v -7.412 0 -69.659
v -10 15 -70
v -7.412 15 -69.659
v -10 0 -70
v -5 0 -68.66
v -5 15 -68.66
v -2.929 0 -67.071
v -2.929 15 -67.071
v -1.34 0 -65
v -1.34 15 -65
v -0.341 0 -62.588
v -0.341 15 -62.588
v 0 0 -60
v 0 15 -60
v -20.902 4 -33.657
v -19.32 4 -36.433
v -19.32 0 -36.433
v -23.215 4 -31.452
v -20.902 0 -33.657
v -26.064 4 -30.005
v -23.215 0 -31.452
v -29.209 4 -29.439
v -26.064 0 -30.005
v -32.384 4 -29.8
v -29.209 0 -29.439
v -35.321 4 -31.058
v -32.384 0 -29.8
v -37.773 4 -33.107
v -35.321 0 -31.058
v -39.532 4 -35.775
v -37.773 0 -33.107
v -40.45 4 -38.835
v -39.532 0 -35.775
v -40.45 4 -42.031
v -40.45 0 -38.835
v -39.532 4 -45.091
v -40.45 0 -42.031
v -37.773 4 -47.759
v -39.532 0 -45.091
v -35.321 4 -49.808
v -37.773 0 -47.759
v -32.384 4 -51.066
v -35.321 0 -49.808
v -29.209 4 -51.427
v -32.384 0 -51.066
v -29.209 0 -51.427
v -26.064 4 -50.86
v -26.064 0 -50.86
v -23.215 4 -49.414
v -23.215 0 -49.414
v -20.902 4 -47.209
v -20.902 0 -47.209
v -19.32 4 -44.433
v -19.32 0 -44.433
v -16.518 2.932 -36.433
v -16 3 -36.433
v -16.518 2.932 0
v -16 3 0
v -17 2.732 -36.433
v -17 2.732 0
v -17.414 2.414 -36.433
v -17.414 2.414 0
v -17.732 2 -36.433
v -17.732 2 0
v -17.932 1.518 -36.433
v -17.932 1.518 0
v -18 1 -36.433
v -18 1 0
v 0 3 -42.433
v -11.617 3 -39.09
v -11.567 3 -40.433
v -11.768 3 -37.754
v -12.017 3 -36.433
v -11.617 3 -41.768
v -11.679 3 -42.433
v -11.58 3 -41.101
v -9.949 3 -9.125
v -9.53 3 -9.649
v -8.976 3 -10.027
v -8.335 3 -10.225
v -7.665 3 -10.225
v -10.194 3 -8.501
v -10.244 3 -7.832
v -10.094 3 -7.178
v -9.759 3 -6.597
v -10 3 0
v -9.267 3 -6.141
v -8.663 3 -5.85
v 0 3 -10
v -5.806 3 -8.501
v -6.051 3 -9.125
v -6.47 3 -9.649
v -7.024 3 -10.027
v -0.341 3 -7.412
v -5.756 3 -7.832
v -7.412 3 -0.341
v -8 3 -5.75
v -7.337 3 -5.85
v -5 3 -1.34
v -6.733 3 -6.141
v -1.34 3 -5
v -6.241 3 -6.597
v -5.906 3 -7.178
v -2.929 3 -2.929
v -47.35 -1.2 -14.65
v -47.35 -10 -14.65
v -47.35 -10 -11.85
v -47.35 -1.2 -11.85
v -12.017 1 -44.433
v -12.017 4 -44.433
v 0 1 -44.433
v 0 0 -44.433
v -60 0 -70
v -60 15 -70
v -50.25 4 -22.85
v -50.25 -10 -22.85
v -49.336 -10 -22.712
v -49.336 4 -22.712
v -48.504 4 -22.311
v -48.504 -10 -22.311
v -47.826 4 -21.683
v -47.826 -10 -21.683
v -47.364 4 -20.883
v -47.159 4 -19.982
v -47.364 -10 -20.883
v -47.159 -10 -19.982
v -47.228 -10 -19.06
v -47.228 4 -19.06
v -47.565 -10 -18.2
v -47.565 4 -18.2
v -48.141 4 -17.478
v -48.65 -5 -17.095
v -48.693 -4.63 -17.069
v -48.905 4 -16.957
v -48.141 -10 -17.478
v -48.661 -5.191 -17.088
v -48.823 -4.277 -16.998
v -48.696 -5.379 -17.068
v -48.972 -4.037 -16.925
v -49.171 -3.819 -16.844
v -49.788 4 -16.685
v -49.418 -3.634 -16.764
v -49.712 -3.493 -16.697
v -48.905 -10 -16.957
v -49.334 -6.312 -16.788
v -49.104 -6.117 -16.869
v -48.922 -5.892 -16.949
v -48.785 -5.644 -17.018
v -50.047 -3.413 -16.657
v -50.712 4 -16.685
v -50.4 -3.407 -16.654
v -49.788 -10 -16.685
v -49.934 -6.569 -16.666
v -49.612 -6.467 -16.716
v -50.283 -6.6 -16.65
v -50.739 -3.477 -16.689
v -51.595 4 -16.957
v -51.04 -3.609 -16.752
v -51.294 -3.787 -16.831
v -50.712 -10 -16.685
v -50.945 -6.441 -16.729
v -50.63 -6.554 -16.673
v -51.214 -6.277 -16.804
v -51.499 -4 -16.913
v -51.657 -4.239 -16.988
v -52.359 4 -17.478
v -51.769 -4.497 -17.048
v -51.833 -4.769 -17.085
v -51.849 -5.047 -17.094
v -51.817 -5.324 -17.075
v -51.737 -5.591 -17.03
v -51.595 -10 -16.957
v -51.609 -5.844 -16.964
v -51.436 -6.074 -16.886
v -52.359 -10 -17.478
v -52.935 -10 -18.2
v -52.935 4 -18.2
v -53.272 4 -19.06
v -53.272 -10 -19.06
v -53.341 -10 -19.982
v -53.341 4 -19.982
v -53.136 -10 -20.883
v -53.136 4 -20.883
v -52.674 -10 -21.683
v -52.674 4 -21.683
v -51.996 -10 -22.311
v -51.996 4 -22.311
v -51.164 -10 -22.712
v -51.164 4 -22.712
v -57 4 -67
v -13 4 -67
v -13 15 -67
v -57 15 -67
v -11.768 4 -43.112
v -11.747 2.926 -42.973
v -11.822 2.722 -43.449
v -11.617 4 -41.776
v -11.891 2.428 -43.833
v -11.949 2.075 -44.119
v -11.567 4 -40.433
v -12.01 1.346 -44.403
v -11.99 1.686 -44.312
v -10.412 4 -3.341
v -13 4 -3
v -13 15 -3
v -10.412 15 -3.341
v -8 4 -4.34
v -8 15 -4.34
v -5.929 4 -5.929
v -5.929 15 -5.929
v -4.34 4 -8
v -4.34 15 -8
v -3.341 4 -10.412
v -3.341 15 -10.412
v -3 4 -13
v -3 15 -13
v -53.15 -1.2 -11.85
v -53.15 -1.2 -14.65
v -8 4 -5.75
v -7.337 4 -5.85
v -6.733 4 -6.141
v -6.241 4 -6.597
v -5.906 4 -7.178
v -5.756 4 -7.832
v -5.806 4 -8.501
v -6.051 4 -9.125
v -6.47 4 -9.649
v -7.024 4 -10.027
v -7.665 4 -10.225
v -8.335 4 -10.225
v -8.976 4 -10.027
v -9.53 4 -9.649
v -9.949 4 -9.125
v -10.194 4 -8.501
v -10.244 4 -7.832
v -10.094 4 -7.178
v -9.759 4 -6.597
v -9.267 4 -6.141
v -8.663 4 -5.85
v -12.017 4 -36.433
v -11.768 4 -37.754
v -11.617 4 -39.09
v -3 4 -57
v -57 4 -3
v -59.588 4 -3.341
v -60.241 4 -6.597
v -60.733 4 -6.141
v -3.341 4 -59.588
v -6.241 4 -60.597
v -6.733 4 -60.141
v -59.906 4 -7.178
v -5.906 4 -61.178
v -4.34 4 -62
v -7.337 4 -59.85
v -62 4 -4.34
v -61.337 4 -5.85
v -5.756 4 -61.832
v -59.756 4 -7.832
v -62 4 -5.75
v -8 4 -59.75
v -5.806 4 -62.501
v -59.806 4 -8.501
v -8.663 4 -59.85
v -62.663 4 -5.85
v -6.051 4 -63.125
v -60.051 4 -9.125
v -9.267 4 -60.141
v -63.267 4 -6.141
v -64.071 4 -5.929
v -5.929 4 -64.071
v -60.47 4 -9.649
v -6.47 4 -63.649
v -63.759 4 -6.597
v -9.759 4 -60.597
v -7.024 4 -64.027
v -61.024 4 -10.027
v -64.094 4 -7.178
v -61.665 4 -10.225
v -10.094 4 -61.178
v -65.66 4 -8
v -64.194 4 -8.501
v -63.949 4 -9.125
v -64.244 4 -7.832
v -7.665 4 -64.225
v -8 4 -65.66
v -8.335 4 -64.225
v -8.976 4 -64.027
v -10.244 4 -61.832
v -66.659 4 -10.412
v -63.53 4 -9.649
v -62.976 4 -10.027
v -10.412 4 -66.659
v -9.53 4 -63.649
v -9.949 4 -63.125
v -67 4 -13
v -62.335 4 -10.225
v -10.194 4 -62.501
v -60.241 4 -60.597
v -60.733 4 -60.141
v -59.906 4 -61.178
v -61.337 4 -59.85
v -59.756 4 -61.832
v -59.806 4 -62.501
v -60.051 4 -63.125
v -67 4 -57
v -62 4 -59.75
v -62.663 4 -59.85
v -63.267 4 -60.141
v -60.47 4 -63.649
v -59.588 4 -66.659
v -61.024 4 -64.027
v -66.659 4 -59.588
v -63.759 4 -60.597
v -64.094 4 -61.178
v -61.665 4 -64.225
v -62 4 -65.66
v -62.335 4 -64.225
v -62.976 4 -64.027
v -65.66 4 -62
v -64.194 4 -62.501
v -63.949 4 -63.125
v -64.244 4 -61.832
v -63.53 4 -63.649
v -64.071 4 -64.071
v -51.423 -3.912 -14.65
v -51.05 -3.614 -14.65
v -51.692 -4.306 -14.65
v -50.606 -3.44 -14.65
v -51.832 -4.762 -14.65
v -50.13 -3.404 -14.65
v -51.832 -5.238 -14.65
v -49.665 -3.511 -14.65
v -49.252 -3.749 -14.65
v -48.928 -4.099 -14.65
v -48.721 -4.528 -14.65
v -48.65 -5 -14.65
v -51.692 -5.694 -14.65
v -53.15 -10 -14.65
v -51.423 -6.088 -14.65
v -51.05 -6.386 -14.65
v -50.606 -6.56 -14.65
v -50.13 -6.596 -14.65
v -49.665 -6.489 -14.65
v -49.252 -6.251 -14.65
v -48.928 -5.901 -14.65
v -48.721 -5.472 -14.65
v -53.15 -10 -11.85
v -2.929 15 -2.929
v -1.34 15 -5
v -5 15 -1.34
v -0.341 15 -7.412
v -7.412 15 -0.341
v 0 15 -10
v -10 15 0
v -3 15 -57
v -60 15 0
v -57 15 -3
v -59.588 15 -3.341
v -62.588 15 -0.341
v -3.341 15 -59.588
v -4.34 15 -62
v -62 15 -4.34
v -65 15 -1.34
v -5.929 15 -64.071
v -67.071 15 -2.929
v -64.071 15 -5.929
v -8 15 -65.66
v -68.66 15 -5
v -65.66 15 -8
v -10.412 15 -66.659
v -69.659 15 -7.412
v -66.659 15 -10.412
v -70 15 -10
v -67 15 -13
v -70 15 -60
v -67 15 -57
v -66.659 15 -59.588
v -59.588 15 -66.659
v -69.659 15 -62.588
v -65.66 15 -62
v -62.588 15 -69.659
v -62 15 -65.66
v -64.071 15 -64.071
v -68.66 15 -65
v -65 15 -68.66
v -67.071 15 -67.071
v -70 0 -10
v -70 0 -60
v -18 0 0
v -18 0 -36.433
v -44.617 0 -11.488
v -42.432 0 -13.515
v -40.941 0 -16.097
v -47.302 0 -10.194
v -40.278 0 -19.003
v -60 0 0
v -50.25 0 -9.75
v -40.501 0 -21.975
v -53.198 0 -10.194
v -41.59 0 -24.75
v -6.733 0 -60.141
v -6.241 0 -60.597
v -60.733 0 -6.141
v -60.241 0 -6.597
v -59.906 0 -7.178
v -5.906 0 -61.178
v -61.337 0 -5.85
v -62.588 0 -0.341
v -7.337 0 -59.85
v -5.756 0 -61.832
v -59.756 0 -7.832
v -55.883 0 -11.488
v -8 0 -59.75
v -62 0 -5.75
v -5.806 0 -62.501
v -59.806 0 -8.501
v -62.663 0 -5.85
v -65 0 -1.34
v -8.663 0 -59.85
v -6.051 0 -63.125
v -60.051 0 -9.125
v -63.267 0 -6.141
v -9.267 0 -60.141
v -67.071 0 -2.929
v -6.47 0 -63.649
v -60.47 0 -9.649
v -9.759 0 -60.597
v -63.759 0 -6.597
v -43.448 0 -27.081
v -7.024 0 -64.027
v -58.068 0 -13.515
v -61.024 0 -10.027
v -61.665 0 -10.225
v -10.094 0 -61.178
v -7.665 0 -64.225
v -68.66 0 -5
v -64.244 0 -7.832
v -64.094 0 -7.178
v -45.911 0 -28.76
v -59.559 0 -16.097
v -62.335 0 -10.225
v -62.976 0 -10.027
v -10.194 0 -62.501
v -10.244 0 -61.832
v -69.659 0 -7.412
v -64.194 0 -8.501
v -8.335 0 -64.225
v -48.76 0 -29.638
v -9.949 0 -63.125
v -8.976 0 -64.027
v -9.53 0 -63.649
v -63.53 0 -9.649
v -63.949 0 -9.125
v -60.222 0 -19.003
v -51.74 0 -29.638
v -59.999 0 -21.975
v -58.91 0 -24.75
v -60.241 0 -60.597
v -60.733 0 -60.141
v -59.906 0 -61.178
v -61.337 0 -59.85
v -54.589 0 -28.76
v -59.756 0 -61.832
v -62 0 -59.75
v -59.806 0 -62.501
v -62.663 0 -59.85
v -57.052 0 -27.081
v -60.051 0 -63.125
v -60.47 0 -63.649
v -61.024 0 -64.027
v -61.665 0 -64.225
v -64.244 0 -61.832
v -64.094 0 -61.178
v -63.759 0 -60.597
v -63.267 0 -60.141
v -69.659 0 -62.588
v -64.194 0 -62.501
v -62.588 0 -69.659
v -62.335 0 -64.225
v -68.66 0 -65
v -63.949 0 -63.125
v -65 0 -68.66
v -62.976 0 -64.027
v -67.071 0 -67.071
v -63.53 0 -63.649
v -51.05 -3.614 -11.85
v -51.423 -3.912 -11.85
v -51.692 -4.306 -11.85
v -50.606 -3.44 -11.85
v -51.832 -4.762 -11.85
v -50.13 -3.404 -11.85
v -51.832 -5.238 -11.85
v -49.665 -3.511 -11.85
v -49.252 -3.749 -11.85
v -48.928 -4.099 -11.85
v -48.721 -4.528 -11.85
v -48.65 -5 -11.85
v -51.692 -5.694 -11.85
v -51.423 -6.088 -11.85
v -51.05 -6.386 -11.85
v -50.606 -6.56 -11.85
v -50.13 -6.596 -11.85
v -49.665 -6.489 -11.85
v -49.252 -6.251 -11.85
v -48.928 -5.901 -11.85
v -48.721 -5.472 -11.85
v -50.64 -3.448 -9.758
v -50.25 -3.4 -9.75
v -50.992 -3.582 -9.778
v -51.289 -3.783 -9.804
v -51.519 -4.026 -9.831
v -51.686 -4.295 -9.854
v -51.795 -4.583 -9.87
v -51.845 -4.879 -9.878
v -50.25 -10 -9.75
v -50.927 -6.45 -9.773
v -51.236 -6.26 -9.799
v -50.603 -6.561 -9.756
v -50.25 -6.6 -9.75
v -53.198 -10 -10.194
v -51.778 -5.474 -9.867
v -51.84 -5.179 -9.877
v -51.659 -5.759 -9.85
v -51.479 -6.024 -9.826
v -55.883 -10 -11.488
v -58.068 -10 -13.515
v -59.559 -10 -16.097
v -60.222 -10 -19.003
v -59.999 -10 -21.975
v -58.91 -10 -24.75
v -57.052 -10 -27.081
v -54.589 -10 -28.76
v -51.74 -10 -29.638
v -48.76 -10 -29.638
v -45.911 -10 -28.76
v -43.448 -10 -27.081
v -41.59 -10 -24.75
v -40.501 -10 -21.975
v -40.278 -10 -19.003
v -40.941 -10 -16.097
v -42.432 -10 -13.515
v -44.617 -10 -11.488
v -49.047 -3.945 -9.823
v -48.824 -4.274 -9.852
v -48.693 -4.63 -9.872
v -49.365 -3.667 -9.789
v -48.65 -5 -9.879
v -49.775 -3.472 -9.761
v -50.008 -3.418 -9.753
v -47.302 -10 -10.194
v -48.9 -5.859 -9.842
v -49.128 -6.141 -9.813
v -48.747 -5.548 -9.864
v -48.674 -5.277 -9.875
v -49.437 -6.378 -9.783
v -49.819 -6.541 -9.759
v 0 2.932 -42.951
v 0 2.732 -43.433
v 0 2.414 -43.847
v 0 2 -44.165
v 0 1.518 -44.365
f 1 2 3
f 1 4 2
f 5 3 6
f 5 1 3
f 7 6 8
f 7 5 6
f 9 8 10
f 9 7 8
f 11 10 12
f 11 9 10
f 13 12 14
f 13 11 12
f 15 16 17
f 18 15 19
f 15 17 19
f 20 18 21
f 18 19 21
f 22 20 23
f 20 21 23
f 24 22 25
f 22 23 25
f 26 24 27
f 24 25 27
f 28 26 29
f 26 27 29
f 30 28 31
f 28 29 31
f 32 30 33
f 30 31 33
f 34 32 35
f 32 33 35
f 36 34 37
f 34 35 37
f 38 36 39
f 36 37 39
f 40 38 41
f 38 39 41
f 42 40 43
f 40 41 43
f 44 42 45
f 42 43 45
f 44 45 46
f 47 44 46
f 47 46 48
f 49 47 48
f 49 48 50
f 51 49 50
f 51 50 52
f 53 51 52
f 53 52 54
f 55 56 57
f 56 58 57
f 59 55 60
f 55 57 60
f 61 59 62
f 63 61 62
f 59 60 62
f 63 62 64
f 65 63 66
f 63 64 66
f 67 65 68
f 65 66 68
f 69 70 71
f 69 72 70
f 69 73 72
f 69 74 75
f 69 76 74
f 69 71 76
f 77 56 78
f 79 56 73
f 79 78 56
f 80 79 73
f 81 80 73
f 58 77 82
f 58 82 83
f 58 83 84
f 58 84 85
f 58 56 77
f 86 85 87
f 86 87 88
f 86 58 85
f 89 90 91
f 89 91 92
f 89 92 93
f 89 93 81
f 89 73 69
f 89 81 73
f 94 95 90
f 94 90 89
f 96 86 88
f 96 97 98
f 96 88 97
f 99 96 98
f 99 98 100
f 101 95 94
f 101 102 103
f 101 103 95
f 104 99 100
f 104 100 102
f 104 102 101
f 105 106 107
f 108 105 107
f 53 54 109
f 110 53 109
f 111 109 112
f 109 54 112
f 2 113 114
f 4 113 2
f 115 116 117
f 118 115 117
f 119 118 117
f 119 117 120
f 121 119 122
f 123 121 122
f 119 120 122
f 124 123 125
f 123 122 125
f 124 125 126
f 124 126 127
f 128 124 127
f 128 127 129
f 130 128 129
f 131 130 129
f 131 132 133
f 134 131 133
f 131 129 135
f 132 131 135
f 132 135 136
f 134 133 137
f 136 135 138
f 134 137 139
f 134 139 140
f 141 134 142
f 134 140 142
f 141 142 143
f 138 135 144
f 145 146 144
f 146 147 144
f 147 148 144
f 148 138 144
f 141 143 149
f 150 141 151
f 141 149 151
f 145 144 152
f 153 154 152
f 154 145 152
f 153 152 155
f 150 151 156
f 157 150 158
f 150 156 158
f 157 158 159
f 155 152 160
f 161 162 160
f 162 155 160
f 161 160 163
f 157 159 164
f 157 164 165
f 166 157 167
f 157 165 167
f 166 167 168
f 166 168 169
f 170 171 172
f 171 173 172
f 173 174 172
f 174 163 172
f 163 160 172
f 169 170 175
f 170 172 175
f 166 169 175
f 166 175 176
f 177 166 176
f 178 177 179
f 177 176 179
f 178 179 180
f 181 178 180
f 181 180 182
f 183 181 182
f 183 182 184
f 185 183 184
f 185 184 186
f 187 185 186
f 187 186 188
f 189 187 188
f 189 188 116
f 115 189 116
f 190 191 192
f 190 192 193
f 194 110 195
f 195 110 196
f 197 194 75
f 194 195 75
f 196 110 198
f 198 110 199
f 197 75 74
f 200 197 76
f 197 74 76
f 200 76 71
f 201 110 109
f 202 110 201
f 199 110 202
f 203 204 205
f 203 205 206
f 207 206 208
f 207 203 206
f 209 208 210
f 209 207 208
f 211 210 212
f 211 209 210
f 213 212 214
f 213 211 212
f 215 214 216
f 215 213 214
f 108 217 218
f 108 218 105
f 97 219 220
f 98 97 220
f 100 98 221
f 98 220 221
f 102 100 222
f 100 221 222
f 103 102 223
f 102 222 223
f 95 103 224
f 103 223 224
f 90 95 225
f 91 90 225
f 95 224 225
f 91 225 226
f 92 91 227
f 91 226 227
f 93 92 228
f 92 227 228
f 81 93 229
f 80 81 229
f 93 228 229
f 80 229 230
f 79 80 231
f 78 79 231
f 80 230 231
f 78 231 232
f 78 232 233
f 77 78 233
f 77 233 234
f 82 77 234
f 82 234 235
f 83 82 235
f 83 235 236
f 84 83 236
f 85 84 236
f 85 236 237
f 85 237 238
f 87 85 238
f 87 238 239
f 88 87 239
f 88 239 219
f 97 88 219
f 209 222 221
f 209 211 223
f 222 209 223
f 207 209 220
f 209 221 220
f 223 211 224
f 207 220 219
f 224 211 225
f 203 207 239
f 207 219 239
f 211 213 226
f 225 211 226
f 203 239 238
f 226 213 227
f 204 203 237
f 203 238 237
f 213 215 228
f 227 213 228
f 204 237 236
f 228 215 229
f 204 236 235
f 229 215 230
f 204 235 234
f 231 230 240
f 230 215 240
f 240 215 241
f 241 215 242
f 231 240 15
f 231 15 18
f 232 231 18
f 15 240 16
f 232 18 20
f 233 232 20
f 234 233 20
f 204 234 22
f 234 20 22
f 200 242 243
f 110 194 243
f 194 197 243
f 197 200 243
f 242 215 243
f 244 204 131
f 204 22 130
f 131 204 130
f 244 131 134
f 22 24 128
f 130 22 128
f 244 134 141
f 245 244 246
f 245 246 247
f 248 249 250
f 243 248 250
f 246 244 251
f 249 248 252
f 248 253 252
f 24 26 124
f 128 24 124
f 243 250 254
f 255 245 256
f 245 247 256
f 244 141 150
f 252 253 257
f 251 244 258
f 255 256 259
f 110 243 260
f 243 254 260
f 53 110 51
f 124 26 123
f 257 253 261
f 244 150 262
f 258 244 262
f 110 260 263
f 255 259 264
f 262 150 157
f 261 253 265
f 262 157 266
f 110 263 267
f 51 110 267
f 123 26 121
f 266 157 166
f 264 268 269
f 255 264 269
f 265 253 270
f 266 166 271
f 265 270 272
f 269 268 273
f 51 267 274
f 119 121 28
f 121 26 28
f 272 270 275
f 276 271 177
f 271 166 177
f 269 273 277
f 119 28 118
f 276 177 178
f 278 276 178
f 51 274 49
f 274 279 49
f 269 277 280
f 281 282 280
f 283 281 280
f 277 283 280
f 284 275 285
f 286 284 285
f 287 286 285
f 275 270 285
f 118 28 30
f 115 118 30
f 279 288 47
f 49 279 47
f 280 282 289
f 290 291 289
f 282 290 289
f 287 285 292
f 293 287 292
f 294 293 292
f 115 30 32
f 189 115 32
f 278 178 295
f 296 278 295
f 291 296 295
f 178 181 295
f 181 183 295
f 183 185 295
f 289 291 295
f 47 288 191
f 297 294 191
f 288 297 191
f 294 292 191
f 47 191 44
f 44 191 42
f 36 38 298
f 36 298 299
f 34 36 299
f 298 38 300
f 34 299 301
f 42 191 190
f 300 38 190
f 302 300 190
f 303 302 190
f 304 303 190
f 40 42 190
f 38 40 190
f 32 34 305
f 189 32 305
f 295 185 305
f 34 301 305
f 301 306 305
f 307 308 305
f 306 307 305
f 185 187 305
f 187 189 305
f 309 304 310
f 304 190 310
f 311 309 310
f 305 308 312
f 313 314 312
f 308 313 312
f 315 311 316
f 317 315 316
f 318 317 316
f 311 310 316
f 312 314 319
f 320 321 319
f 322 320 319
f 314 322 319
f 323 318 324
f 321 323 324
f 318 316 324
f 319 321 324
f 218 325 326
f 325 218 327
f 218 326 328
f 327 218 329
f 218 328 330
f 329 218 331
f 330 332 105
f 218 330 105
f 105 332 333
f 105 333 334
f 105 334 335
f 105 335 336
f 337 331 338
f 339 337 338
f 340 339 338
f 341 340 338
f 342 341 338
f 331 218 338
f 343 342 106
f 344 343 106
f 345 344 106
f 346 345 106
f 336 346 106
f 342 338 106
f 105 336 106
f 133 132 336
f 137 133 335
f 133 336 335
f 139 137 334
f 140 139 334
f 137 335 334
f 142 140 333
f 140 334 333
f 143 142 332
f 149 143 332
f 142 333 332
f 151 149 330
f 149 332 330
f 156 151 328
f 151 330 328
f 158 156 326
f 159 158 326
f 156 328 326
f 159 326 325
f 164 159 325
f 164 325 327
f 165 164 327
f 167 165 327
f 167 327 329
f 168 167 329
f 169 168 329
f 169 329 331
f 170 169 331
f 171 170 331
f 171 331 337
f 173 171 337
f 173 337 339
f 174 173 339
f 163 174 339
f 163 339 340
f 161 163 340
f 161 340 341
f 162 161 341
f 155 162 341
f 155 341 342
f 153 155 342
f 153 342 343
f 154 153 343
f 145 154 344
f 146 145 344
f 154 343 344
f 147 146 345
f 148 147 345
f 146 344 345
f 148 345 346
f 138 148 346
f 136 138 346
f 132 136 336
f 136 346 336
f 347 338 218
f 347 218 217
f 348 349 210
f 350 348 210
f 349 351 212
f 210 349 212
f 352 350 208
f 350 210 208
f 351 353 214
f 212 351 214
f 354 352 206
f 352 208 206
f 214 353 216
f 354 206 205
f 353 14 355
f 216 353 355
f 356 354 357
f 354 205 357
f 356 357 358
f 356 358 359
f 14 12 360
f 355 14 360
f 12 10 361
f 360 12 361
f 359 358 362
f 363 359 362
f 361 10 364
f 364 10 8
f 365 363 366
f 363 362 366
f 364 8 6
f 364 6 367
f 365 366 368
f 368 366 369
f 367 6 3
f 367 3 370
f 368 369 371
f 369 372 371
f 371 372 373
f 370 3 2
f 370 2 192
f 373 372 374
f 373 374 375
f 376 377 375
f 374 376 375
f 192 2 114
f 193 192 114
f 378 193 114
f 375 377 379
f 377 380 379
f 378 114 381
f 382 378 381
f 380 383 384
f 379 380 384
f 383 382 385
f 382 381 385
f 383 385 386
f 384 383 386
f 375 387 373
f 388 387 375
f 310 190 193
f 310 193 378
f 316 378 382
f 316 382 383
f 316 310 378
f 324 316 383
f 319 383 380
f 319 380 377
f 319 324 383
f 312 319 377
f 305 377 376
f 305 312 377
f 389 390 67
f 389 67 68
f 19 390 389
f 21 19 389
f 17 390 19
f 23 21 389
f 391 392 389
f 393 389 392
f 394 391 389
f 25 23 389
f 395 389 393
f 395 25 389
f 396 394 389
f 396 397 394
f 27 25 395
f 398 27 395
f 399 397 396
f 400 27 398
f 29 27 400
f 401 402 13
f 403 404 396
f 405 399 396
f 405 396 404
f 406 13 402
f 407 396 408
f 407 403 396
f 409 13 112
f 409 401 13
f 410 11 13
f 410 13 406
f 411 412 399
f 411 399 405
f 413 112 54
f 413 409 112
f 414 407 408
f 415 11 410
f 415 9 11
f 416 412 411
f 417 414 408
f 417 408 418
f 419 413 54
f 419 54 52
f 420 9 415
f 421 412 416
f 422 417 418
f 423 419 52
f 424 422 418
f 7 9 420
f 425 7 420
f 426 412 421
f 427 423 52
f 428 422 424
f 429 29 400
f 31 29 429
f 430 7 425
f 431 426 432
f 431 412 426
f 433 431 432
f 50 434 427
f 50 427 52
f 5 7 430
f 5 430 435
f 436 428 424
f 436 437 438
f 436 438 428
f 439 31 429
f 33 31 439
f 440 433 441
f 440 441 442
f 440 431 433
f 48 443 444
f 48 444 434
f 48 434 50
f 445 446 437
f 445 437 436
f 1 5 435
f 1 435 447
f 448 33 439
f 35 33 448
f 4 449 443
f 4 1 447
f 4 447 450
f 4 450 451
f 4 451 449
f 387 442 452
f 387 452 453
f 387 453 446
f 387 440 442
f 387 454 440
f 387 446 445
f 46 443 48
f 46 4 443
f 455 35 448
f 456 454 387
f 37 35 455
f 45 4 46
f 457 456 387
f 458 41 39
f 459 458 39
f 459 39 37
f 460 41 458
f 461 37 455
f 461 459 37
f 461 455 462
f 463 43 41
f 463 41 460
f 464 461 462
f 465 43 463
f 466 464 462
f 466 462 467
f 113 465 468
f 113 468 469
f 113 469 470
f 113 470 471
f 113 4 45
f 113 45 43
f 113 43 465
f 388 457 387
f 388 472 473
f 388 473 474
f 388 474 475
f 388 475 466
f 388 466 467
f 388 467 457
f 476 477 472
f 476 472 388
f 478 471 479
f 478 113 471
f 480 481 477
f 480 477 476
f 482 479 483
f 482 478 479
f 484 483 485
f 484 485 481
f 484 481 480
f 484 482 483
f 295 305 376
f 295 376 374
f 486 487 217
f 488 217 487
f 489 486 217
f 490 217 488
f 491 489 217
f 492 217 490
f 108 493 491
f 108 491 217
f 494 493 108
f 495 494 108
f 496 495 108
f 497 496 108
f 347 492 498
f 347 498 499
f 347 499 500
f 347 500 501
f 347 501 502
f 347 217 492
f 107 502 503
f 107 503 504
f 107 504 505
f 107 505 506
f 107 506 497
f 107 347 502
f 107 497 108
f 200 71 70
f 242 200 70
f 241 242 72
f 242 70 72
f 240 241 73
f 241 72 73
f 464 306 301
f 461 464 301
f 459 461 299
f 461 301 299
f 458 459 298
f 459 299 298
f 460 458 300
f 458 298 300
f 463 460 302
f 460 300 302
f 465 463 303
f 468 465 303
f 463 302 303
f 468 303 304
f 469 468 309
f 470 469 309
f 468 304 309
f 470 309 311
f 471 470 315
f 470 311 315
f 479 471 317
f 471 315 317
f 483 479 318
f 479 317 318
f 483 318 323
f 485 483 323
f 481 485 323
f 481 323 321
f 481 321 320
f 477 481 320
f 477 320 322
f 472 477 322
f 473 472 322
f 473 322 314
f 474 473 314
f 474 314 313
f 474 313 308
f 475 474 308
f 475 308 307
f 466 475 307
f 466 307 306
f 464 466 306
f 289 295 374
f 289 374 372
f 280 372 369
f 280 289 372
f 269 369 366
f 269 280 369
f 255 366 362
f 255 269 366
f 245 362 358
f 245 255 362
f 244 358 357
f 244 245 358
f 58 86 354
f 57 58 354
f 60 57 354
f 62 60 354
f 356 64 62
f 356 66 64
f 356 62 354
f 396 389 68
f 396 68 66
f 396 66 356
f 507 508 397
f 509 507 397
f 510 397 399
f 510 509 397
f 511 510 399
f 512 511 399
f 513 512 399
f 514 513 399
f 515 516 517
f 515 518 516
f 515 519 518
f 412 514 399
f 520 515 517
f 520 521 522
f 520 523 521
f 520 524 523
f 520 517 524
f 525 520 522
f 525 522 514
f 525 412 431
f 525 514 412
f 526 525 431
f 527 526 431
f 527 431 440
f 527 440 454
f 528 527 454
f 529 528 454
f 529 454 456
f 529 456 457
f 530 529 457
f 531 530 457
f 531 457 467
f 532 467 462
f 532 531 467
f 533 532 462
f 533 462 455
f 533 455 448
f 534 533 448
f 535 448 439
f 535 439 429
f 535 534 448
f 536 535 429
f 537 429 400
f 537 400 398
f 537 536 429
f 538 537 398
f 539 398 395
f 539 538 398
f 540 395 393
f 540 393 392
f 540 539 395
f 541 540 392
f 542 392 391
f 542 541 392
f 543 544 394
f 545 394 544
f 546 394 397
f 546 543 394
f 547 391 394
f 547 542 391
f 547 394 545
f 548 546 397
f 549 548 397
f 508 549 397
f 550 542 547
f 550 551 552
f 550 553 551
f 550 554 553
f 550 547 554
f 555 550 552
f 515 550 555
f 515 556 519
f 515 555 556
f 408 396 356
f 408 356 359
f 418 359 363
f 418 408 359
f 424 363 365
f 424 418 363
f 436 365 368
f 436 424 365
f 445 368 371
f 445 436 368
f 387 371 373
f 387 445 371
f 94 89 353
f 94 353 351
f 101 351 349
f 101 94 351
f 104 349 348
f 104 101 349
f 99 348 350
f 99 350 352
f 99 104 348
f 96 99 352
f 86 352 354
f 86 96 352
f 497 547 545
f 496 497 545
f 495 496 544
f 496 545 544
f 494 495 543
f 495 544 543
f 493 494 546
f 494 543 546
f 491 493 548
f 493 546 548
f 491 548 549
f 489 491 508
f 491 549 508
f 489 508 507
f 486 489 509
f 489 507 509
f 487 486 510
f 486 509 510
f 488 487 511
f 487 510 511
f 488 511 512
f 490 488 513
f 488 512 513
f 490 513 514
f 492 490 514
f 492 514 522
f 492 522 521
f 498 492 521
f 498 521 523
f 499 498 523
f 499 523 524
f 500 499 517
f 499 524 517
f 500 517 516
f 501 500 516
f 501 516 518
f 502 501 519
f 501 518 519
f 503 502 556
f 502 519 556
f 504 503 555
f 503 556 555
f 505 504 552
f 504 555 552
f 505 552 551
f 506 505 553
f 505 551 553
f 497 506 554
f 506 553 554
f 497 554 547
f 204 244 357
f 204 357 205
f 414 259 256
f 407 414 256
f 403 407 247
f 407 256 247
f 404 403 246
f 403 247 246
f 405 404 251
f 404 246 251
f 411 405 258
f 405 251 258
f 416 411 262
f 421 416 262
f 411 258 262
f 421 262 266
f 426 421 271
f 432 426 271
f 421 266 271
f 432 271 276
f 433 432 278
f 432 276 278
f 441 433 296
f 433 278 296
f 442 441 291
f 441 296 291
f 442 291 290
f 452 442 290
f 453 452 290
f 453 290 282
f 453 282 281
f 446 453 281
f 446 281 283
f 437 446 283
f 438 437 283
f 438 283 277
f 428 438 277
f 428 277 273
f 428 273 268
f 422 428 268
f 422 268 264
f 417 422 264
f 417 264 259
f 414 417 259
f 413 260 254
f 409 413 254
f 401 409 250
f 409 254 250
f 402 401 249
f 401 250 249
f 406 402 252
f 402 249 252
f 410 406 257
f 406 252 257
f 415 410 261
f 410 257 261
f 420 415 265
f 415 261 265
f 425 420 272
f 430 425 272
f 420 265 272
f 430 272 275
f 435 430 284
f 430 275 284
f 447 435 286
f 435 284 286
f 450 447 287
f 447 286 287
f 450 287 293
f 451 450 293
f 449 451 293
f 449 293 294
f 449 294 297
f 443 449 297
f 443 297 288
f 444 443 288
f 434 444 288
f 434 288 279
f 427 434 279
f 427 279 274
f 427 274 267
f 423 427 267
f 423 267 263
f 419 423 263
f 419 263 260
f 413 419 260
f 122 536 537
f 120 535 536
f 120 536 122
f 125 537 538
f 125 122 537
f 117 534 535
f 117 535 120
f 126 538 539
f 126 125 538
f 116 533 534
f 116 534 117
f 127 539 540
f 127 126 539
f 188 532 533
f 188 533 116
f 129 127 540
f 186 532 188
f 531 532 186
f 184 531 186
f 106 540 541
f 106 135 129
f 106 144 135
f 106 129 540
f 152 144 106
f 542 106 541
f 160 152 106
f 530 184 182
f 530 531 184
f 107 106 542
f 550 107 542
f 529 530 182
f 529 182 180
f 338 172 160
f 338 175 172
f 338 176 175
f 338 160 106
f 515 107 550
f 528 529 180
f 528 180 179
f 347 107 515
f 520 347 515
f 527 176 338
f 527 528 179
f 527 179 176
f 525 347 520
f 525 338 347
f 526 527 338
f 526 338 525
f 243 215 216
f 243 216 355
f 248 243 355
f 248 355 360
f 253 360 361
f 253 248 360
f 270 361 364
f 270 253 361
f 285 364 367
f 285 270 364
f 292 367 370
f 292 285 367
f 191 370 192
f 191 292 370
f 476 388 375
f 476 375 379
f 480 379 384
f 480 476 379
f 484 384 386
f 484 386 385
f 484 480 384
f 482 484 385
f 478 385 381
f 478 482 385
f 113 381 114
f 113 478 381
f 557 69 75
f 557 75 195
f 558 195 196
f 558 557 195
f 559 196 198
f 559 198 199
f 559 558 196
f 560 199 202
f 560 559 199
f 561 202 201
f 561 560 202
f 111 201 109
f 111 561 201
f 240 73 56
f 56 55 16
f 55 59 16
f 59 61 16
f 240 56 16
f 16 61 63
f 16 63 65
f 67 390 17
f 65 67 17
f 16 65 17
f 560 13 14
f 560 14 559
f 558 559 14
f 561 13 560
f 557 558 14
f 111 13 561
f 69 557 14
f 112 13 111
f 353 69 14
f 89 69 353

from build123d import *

# Parameters (mm, degrees)
SKETCH1_R           = 2.5
BOSS_EXTRUDE2_DEPTH = 4
BOSS_EXTRUDE3_DEPTH = 11
SKETCH3_R           = 3.1
CUT_EXTRUDE1_DEPTH  = 8.5
BOSS_EXTRUDE4_START = 10
SKETCH4_R           = 10
SKETCH4_R_2         = 3.1
BOSS_EXTRUDE4_DEPTH = 10
SKETCH5_W           = 5.8
SKETCH5_H           = 2.8
CUT_EXTRUDE2_DEPTH  = 8.8
SKETCH7_R           = 1.6
CUT_EXTRUDE3_DEPTH  = 10
SKETCH13_R          = 11
CUT_EXTRUDE6_DEPTH  = 10
SKETCH14_R          = 2.25
CUT_EXTRUDE7_DEPTH  = 10
CUT_EXTRUDE8_DEPTH  = 10
SKETCH16_W          = 18
SKETCH16_H          = 44.43287335
CUT_EXTRUDE9_DEPTH  = 3
FILLET1_R           = 2


with BuildPart() as part:
    # Sketch1 → Boss-Extrude2 (new body)
    with BuildSketch(Plane(origin=(0, 0, 0), x_dir=(1, 0, 0), z_dir=(0, 1, 0))):
        with BuildLine():
            Line((-10, 0), (-60, 0))
            ThreePointArc((-60, 0), (-67.071067812, 2.928932188), (-70, 10))
            Line((-70, 10), (-70, 60))
            ThreePointArc((-70, 60), (-67.071067812, 67.071067812), (-60, 70))
            Line((-60, 70), (-10, 70))
            ThreePointArc((-10, 70), (-2.928932188, 67.071067812), (0, 60))
            Line((0, 60), (0, 10))
            ThreePointArc((0, 10), (-2.928932188, 2.928932188), (-10, 0))
        make_face()
        with Locations(Location((-50.25, 19.75, 0), (0, 0, 270))):
            Circle(SKETCH1_R, mode=Mode.SUBTRACT)
        with Locations(Location((-29.56712665, 40.43287335, 0), (0, 0, 270))):
            Circle(SKETCH1_R, mode=Mode.SUBTRACT)
    extrude(amount=BOSS_EXTRUDE2_DEPTH)

    # Sketch2 → Boss-Extrude3 (add)
    with BuildSketch(Plane(origin=(0, 4, 0), x_dir=(1, 0, 0), z_dir=(0, 1, 0))):
        with BuildLine():
            Line((-10, 0), (-60, 0))
            ThreePointArc((-60, 0), (-67.071067812, 2.928932188), (-70, 10))
            Line((-70, 10), (-70, 60))
            ThreePointArc((-70, 60), (-67.071067812, 67.071067812), (-60, 70))
            Line((-60, 70), (-10, 70))
            ThreePointArc((-10, 70), (-2.928932188, 67.071067812), (0, 60))
            Line((0, 60), (0, 10))
            ThreePointArc((0, 10), (-2.928932188, 2.928932188), (-10, 0))
        make_face()
        with BuildLine():
            Line((-3, 13), (-3, 57))
            ThreePointArc((-3, 57), (-5.928932188, 64.071067812), (-13, 67))
            Line((-13, 67), (-57, 67))
            ThreePointArc((-57, 67), (-64.071067812, 64.071067812), (-67, 57))
            Line((-67, 57), (-67, 13))
            ThreePointArc((-67, 13), (-64.071067812, 5.928932188), (-57, 3))
            Line((-57, 3), (-13, 3))
            ThreePointArc((-13, 3), (-5.928932188, 5.928932188), (-3, 13))
        make_face(mode=Mode.SUBTRACT)
    extrude(amount=BOSS_EXTRUDE3_DEPTH)

    # Sketch3 → Cut-Extrude1 (cut)
    with BuildSketch(Plane.XZ):
        with Locations(Location((-50.25, -19.75, 0), (0, 0, 270))):
            Circle(SKETCH3_R)
    extrude(amount=-CUT_EXTRUDE1_DEPTH, mode=Mode.SUBTRACT)

    # Sketch4 → Boss-Extrude4 (add)
    with BuildSketch(Plane.XZ.offset(BOSS_EXTRUDE4_START)):
        with Locations(Location((-50.25, -19.75, 0), (0, 0, 90))):
            Circle(SKETCH4_R)
        with Locations(Location((-50.25, -19.75, 0), (0, 0, 270))):
            Circle(SKETCH4_R_2, mode=Mode.SUBTRACT)
    extrude(amount=-BOSS_EXTRUDE4_DEPTH)

    # Sketch5 → Cut-Extrude2 (cut)
    with BuildSketch(Plane.XZ.offset(10)):
        with Locations((-50.25, -13.25)):
            Rectangle(SKETCH5_W, SKETCH5_H)
    extrude(amount=-CUT_EXTRUDE2_DEPTH, mode=Mode.SUBTRACT)

    # Sketch7 → Cut-Extrude3 (cut)
    with BuildSketch(Plane(origin=(-50.25, -10, -9.75), x_dir=(1, 0, 0), z_dir=(0, 0, 1))):
        with Locations((0, 5)):
            Circle(SKETCH7_R)
    extrude(amount=-CUT_EXTRUDE3_DEPTH, mode=Mode.SUBTRACT)

    # Sketch13 → Cut-Extrude6 (cut)
    with BuildSketch(Plane.XZ):
        with Locations(Location((-29.56712665, -40.43287335, 0), (0, 0, 270))):
            Circle(SKETCH13_R)
    extrude(amount=-CUT_EXTRUDE6_DEPTH, mode=Mode.SUBTRACT)

    # Sketch14 → Cut-Extrude7 (cut)
    with BuildSketch(Plane(origin=(0, 4, 0), x_dir=(1, 0, 0), z_dir=(0, 1, 0))):
        with Locations(Location((-8, 62, 0), (0, 0, 270))):
            Circle(SKETCH14_R)
        with Locations(Location((-62, 62, 0), (0, 0, 270))):
            Circle(SKETCH14_R)
        with Locations(Location((-62, 8, 0), (0, 0, 270))):
            Circle(SKETCH14_R)
        with Locations(Location((-8, 8, 0), (0, 0, 270))):
            Circle(SKETCH14_R)
    extrude(amount=-CUT_EXTRUDE7_DEPTH, mode=Mode.SUBTRACT)

    # Sketch15 → Cut-Extrude8 (cut)
    with BuildSketch(Plane.XZ):
        with BuildLine():
            ThreePointArc((-19.320175884, -36.43287335), (-18.757028167, -38.397739254), (-18.56712665, -40.43287335))
            Line((-18.56712665, -40.43287335), (-11.56712665, -40.43287335))
            ThreePointArc((-11.56712665, -40.43287335), (-11.679998346, -38.420252912), (-12.017197876, -36.43287335))
            Line((-12.017197876, -36.43287335), (-19.320175884, -36.43287335))
        make_face()
        with BuildLine():
            Line((-11.56712665, -40.43287335), (-18.56712665, -40.43287335))
            ThreePointArc((-18.56712665, -40.43287335), (-18.757028167, -42.468007445), (-19.320175884, -44.43287335))
            Line((-19.320175884, -44.43287335), (-12.017197876, -44.43287335))
            ThreePointArc((-12.017197876, -44.43287335), (-11.679998346, -42.445493788), (-11.56712665, -40.43287335))
        make_face()
    extrude(amount=-CUT_EXTRUDE8_DEPTH, mode=Mode.SUBTRACT)

    # Sketch16 → Cut-Extrude9 (cut)
    with BuildSketch(Plane.XZ):
        with Locations((-9, -22.216436675)):
            Rectangle(SKETCH16_W, SKETCH16_H)
    extrude(amount=-CUT_EXTRUDE9_DEPTH, mode=Mode.SUBTRACT)

    # Fillet1
    fillet1_edges = [part.edges().sort_by_distance(p)[0] for p in [
        (-6.008598938, 3, -44.43287335),
        (-18, 3, -18.216436675),
    ]]
    fillet(fillet1_edges, radius=FILLET1_R)


solid = part.part
